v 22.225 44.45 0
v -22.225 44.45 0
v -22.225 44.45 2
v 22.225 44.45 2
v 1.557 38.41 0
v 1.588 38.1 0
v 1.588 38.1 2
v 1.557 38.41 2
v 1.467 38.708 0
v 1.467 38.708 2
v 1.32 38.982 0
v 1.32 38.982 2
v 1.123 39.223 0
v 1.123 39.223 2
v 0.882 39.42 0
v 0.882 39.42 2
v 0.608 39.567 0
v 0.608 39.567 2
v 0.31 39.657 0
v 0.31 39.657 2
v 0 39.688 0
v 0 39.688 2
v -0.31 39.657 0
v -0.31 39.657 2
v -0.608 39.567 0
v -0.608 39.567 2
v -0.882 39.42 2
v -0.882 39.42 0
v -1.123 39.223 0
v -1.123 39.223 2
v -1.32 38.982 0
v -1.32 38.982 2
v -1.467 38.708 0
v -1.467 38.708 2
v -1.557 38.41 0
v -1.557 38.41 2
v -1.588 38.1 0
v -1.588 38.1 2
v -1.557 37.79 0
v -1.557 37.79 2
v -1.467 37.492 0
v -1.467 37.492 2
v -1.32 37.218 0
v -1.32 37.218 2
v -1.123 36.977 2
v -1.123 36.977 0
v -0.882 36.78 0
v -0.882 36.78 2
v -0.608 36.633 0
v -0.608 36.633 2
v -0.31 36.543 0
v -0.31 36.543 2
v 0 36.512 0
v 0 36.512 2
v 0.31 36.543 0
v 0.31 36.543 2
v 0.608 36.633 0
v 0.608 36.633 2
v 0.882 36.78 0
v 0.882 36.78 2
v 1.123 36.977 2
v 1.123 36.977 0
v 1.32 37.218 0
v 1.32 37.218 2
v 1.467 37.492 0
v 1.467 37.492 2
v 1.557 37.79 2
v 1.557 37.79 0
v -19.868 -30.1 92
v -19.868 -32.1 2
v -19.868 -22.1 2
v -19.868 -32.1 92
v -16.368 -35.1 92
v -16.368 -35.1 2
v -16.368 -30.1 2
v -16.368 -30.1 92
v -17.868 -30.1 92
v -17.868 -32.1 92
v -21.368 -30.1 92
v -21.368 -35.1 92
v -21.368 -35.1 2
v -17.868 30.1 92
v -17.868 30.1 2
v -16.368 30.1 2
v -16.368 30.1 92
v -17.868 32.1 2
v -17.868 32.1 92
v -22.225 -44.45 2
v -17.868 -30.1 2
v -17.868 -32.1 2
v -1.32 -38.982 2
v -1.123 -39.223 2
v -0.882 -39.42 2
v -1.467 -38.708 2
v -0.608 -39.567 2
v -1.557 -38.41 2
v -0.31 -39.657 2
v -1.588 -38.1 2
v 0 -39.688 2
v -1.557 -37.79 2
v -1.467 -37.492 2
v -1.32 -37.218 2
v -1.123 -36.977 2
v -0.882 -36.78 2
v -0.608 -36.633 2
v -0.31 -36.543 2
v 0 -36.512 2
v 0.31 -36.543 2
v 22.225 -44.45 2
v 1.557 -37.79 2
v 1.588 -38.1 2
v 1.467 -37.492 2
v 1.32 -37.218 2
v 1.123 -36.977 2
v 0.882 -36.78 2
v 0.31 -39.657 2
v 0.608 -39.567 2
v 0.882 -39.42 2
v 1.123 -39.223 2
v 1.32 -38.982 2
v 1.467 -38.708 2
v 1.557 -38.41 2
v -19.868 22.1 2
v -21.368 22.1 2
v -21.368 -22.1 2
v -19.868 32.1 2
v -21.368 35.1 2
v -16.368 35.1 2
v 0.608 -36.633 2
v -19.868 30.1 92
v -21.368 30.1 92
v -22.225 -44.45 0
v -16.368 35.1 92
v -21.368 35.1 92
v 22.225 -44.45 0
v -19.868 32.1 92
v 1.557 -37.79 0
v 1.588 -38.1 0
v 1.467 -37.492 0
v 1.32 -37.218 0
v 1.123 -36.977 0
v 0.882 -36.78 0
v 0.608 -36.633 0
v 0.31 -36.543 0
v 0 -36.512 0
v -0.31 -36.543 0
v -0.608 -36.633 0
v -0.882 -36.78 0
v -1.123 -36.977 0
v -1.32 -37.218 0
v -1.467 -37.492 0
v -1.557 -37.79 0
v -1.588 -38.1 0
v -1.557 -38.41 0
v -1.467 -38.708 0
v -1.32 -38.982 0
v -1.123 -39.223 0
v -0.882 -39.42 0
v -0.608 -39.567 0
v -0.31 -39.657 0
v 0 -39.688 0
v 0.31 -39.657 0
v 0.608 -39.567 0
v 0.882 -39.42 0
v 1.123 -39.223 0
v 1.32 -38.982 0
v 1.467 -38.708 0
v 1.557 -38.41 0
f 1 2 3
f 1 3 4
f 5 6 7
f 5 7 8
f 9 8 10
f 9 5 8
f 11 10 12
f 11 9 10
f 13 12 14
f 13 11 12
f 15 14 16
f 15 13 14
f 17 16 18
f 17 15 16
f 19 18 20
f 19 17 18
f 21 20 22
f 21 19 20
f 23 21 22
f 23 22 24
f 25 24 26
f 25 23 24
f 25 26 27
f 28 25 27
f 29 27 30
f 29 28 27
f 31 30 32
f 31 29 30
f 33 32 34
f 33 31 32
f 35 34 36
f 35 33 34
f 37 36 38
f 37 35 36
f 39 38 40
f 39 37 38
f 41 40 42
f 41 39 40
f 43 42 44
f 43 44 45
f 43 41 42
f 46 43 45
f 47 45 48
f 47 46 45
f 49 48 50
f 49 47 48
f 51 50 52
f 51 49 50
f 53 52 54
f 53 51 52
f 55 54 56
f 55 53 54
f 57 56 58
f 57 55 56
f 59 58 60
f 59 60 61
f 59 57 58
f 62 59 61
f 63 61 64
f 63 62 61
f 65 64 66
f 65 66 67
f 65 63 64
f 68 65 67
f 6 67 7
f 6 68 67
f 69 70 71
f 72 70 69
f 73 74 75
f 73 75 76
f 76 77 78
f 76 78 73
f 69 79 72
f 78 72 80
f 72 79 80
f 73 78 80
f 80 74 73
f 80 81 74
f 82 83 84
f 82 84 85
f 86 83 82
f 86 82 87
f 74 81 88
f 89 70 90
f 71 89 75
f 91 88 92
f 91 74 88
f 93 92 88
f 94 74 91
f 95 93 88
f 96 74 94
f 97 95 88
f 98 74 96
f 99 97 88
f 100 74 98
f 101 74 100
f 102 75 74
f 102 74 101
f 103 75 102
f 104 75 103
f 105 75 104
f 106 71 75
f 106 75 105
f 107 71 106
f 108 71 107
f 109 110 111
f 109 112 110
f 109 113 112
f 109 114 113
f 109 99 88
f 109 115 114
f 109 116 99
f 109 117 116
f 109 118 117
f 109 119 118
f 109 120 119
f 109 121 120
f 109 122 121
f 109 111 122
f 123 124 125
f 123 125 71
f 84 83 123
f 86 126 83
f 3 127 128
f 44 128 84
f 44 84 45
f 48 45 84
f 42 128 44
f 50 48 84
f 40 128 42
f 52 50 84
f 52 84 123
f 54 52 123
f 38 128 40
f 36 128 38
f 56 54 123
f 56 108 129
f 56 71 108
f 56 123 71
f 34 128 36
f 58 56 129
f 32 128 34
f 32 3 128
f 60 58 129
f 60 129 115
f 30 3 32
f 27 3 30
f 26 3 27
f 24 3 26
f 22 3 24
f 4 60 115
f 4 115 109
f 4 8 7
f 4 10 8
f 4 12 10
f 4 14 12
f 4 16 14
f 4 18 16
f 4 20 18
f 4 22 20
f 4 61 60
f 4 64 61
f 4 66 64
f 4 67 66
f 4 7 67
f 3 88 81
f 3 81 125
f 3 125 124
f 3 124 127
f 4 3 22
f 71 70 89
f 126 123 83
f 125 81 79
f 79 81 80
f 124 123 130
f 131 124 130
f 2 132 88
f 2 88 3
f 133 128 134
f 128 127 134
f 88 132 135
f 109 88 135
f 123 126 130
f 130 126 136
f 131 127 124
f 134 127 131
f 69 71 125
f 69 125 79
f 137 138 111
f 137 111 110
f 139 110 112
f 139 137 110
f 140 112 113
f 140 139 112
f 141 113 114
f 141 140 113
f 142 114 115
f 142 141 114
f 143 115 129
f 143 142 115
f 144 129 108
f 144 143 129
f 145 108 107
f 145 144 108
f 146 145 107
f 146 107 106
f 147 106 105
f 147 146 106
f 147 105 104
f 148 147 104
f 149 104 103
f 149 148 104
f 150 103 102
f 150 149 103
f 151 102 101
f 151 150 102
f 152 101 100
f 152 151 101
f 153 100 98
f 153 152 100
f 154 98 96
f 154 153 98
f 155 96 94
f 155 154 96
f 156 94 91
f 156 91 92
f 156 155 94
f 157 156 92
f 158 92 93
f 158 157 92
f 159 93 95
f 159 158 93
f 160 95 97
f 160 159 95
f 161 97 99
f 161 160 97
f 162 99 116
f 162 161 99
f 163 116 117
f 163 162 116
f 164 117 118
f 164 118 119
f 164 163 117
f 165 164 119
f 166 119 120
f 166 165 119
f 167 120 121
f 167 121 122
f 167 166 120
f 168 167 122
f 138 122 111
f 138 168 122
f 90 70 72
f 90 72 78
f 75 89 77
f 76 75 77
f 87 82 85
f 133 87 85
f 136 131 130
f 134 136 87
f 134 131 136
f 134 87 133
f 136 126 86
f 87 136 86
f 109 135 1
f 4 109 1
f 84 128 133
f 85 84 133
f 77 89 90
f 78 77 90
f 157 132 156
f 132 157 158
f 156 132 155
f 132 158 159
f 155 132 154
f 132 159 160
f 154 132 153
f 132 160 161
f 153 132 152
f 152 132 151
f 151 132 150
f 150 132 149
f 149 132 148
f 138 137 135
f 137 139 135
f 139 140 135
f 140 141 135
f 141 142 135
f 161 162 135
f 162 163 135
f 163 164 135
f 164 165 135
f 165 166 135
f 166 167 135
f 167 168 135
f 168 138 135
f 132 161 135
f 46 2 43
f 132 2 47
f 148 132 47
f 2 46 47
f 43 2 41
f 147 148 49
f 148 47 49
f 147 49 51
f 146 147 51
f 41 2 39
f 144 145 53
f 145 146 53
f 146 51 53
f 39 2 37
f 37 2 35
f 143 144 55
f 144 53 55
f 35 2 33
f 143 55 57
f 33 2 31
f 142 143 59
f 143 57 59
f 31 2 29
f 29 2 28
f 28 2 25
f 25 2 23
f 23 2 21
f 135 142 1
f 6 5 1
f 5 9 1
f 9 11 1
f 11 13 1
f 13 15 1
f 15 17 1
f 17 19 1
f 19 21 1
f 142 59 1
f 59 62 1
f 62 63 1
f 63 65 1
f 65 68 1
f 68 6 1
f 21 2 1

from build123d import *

# Parameters (mm, degrees)
FRONT_FACE_W        = 44.45
FRONT_FACE_H        = 88.9
FRONT_FACE_R        = 1.5875
BOSS_EXTRUDE1_DEPTH = 2
CANTIARM_W          = 90
CANTIARM_H          = 5
BOSS_EXTRUDE2_DEPTH = 2.5
CHANNEL_W           = 2
CHANNEL_H           = 2
CUT_EXTRUDE1_DEPTH  = 91
BOSS_EXTRUDE5_START = 1
BOSS_EXTRUDE5_DEPTH = 1.5


with BuildPart() as part:
    # Front Face → Boss-Extrude1 (new body)
    with BuildSketch(Plane.XY):
        Rectangle(FRONT_FACE_W, FRONT_FACE_H)
        with Locations((0, 38.1)):
            Circle(FRONT_FACE_R, mode=Mode.SUBTRACT)
        with Locations((0, -38.1)):
            Circle(FRONT_FACE_R, mode=Mode.SUBTRACT)
    extrude(amount=BOSS_EXTRUDE1_DEPTH)

    # CantiArm → Boss-Extrude2 (add, symmetric)
    with BuildSketch(Plane.ZY.offset(18.868316672)):
        with Locations((47, 32.6)):
            Rectangle(CANTIARM_W, CANTIARM_H)
    boss_extrude2 = extrude(amount=BOSS_EXTRUDE2_DEPTH, both=True)

    # Channel → Cut-Extrude1 (cut, through all)
    with BuildSketch(Plane.XY.offset(2)):
        with Locations((-18.868316672, 31.1)):
            Rectangle(CHANNEL_W, CHANNEL_H)
    cut_extrude1 = extrude(amount=CUT_EXTRUDE1_DEPTH, mode=Mode.SUBTRACT)

    # Sketch5 → Boss-Extrude5 (add)
    with BuildSketch(Plane.ZY.offset(18.868316672).offset(BOSS_EXTRUDE5_START)):
        Polygon((2, 22.1), (92, 30.1), (2, 30.1), align=None)
    boss_extrude5 = extrude(amount=BOSS_EXTRUDE5_DEPTH)

    # Mirror1: Boss-Extrude2, Cut-Extrude1, Boss-Extrude5 across plane
    add(boss_extrude2.mirror(Plane.ZX))
    add(cut_extrude1.mirror(Plane.ZX), mode=Mode.SUBTRACT)
    add(boss_extrude5.mirror(Plane.ZX))


solid = part.part
